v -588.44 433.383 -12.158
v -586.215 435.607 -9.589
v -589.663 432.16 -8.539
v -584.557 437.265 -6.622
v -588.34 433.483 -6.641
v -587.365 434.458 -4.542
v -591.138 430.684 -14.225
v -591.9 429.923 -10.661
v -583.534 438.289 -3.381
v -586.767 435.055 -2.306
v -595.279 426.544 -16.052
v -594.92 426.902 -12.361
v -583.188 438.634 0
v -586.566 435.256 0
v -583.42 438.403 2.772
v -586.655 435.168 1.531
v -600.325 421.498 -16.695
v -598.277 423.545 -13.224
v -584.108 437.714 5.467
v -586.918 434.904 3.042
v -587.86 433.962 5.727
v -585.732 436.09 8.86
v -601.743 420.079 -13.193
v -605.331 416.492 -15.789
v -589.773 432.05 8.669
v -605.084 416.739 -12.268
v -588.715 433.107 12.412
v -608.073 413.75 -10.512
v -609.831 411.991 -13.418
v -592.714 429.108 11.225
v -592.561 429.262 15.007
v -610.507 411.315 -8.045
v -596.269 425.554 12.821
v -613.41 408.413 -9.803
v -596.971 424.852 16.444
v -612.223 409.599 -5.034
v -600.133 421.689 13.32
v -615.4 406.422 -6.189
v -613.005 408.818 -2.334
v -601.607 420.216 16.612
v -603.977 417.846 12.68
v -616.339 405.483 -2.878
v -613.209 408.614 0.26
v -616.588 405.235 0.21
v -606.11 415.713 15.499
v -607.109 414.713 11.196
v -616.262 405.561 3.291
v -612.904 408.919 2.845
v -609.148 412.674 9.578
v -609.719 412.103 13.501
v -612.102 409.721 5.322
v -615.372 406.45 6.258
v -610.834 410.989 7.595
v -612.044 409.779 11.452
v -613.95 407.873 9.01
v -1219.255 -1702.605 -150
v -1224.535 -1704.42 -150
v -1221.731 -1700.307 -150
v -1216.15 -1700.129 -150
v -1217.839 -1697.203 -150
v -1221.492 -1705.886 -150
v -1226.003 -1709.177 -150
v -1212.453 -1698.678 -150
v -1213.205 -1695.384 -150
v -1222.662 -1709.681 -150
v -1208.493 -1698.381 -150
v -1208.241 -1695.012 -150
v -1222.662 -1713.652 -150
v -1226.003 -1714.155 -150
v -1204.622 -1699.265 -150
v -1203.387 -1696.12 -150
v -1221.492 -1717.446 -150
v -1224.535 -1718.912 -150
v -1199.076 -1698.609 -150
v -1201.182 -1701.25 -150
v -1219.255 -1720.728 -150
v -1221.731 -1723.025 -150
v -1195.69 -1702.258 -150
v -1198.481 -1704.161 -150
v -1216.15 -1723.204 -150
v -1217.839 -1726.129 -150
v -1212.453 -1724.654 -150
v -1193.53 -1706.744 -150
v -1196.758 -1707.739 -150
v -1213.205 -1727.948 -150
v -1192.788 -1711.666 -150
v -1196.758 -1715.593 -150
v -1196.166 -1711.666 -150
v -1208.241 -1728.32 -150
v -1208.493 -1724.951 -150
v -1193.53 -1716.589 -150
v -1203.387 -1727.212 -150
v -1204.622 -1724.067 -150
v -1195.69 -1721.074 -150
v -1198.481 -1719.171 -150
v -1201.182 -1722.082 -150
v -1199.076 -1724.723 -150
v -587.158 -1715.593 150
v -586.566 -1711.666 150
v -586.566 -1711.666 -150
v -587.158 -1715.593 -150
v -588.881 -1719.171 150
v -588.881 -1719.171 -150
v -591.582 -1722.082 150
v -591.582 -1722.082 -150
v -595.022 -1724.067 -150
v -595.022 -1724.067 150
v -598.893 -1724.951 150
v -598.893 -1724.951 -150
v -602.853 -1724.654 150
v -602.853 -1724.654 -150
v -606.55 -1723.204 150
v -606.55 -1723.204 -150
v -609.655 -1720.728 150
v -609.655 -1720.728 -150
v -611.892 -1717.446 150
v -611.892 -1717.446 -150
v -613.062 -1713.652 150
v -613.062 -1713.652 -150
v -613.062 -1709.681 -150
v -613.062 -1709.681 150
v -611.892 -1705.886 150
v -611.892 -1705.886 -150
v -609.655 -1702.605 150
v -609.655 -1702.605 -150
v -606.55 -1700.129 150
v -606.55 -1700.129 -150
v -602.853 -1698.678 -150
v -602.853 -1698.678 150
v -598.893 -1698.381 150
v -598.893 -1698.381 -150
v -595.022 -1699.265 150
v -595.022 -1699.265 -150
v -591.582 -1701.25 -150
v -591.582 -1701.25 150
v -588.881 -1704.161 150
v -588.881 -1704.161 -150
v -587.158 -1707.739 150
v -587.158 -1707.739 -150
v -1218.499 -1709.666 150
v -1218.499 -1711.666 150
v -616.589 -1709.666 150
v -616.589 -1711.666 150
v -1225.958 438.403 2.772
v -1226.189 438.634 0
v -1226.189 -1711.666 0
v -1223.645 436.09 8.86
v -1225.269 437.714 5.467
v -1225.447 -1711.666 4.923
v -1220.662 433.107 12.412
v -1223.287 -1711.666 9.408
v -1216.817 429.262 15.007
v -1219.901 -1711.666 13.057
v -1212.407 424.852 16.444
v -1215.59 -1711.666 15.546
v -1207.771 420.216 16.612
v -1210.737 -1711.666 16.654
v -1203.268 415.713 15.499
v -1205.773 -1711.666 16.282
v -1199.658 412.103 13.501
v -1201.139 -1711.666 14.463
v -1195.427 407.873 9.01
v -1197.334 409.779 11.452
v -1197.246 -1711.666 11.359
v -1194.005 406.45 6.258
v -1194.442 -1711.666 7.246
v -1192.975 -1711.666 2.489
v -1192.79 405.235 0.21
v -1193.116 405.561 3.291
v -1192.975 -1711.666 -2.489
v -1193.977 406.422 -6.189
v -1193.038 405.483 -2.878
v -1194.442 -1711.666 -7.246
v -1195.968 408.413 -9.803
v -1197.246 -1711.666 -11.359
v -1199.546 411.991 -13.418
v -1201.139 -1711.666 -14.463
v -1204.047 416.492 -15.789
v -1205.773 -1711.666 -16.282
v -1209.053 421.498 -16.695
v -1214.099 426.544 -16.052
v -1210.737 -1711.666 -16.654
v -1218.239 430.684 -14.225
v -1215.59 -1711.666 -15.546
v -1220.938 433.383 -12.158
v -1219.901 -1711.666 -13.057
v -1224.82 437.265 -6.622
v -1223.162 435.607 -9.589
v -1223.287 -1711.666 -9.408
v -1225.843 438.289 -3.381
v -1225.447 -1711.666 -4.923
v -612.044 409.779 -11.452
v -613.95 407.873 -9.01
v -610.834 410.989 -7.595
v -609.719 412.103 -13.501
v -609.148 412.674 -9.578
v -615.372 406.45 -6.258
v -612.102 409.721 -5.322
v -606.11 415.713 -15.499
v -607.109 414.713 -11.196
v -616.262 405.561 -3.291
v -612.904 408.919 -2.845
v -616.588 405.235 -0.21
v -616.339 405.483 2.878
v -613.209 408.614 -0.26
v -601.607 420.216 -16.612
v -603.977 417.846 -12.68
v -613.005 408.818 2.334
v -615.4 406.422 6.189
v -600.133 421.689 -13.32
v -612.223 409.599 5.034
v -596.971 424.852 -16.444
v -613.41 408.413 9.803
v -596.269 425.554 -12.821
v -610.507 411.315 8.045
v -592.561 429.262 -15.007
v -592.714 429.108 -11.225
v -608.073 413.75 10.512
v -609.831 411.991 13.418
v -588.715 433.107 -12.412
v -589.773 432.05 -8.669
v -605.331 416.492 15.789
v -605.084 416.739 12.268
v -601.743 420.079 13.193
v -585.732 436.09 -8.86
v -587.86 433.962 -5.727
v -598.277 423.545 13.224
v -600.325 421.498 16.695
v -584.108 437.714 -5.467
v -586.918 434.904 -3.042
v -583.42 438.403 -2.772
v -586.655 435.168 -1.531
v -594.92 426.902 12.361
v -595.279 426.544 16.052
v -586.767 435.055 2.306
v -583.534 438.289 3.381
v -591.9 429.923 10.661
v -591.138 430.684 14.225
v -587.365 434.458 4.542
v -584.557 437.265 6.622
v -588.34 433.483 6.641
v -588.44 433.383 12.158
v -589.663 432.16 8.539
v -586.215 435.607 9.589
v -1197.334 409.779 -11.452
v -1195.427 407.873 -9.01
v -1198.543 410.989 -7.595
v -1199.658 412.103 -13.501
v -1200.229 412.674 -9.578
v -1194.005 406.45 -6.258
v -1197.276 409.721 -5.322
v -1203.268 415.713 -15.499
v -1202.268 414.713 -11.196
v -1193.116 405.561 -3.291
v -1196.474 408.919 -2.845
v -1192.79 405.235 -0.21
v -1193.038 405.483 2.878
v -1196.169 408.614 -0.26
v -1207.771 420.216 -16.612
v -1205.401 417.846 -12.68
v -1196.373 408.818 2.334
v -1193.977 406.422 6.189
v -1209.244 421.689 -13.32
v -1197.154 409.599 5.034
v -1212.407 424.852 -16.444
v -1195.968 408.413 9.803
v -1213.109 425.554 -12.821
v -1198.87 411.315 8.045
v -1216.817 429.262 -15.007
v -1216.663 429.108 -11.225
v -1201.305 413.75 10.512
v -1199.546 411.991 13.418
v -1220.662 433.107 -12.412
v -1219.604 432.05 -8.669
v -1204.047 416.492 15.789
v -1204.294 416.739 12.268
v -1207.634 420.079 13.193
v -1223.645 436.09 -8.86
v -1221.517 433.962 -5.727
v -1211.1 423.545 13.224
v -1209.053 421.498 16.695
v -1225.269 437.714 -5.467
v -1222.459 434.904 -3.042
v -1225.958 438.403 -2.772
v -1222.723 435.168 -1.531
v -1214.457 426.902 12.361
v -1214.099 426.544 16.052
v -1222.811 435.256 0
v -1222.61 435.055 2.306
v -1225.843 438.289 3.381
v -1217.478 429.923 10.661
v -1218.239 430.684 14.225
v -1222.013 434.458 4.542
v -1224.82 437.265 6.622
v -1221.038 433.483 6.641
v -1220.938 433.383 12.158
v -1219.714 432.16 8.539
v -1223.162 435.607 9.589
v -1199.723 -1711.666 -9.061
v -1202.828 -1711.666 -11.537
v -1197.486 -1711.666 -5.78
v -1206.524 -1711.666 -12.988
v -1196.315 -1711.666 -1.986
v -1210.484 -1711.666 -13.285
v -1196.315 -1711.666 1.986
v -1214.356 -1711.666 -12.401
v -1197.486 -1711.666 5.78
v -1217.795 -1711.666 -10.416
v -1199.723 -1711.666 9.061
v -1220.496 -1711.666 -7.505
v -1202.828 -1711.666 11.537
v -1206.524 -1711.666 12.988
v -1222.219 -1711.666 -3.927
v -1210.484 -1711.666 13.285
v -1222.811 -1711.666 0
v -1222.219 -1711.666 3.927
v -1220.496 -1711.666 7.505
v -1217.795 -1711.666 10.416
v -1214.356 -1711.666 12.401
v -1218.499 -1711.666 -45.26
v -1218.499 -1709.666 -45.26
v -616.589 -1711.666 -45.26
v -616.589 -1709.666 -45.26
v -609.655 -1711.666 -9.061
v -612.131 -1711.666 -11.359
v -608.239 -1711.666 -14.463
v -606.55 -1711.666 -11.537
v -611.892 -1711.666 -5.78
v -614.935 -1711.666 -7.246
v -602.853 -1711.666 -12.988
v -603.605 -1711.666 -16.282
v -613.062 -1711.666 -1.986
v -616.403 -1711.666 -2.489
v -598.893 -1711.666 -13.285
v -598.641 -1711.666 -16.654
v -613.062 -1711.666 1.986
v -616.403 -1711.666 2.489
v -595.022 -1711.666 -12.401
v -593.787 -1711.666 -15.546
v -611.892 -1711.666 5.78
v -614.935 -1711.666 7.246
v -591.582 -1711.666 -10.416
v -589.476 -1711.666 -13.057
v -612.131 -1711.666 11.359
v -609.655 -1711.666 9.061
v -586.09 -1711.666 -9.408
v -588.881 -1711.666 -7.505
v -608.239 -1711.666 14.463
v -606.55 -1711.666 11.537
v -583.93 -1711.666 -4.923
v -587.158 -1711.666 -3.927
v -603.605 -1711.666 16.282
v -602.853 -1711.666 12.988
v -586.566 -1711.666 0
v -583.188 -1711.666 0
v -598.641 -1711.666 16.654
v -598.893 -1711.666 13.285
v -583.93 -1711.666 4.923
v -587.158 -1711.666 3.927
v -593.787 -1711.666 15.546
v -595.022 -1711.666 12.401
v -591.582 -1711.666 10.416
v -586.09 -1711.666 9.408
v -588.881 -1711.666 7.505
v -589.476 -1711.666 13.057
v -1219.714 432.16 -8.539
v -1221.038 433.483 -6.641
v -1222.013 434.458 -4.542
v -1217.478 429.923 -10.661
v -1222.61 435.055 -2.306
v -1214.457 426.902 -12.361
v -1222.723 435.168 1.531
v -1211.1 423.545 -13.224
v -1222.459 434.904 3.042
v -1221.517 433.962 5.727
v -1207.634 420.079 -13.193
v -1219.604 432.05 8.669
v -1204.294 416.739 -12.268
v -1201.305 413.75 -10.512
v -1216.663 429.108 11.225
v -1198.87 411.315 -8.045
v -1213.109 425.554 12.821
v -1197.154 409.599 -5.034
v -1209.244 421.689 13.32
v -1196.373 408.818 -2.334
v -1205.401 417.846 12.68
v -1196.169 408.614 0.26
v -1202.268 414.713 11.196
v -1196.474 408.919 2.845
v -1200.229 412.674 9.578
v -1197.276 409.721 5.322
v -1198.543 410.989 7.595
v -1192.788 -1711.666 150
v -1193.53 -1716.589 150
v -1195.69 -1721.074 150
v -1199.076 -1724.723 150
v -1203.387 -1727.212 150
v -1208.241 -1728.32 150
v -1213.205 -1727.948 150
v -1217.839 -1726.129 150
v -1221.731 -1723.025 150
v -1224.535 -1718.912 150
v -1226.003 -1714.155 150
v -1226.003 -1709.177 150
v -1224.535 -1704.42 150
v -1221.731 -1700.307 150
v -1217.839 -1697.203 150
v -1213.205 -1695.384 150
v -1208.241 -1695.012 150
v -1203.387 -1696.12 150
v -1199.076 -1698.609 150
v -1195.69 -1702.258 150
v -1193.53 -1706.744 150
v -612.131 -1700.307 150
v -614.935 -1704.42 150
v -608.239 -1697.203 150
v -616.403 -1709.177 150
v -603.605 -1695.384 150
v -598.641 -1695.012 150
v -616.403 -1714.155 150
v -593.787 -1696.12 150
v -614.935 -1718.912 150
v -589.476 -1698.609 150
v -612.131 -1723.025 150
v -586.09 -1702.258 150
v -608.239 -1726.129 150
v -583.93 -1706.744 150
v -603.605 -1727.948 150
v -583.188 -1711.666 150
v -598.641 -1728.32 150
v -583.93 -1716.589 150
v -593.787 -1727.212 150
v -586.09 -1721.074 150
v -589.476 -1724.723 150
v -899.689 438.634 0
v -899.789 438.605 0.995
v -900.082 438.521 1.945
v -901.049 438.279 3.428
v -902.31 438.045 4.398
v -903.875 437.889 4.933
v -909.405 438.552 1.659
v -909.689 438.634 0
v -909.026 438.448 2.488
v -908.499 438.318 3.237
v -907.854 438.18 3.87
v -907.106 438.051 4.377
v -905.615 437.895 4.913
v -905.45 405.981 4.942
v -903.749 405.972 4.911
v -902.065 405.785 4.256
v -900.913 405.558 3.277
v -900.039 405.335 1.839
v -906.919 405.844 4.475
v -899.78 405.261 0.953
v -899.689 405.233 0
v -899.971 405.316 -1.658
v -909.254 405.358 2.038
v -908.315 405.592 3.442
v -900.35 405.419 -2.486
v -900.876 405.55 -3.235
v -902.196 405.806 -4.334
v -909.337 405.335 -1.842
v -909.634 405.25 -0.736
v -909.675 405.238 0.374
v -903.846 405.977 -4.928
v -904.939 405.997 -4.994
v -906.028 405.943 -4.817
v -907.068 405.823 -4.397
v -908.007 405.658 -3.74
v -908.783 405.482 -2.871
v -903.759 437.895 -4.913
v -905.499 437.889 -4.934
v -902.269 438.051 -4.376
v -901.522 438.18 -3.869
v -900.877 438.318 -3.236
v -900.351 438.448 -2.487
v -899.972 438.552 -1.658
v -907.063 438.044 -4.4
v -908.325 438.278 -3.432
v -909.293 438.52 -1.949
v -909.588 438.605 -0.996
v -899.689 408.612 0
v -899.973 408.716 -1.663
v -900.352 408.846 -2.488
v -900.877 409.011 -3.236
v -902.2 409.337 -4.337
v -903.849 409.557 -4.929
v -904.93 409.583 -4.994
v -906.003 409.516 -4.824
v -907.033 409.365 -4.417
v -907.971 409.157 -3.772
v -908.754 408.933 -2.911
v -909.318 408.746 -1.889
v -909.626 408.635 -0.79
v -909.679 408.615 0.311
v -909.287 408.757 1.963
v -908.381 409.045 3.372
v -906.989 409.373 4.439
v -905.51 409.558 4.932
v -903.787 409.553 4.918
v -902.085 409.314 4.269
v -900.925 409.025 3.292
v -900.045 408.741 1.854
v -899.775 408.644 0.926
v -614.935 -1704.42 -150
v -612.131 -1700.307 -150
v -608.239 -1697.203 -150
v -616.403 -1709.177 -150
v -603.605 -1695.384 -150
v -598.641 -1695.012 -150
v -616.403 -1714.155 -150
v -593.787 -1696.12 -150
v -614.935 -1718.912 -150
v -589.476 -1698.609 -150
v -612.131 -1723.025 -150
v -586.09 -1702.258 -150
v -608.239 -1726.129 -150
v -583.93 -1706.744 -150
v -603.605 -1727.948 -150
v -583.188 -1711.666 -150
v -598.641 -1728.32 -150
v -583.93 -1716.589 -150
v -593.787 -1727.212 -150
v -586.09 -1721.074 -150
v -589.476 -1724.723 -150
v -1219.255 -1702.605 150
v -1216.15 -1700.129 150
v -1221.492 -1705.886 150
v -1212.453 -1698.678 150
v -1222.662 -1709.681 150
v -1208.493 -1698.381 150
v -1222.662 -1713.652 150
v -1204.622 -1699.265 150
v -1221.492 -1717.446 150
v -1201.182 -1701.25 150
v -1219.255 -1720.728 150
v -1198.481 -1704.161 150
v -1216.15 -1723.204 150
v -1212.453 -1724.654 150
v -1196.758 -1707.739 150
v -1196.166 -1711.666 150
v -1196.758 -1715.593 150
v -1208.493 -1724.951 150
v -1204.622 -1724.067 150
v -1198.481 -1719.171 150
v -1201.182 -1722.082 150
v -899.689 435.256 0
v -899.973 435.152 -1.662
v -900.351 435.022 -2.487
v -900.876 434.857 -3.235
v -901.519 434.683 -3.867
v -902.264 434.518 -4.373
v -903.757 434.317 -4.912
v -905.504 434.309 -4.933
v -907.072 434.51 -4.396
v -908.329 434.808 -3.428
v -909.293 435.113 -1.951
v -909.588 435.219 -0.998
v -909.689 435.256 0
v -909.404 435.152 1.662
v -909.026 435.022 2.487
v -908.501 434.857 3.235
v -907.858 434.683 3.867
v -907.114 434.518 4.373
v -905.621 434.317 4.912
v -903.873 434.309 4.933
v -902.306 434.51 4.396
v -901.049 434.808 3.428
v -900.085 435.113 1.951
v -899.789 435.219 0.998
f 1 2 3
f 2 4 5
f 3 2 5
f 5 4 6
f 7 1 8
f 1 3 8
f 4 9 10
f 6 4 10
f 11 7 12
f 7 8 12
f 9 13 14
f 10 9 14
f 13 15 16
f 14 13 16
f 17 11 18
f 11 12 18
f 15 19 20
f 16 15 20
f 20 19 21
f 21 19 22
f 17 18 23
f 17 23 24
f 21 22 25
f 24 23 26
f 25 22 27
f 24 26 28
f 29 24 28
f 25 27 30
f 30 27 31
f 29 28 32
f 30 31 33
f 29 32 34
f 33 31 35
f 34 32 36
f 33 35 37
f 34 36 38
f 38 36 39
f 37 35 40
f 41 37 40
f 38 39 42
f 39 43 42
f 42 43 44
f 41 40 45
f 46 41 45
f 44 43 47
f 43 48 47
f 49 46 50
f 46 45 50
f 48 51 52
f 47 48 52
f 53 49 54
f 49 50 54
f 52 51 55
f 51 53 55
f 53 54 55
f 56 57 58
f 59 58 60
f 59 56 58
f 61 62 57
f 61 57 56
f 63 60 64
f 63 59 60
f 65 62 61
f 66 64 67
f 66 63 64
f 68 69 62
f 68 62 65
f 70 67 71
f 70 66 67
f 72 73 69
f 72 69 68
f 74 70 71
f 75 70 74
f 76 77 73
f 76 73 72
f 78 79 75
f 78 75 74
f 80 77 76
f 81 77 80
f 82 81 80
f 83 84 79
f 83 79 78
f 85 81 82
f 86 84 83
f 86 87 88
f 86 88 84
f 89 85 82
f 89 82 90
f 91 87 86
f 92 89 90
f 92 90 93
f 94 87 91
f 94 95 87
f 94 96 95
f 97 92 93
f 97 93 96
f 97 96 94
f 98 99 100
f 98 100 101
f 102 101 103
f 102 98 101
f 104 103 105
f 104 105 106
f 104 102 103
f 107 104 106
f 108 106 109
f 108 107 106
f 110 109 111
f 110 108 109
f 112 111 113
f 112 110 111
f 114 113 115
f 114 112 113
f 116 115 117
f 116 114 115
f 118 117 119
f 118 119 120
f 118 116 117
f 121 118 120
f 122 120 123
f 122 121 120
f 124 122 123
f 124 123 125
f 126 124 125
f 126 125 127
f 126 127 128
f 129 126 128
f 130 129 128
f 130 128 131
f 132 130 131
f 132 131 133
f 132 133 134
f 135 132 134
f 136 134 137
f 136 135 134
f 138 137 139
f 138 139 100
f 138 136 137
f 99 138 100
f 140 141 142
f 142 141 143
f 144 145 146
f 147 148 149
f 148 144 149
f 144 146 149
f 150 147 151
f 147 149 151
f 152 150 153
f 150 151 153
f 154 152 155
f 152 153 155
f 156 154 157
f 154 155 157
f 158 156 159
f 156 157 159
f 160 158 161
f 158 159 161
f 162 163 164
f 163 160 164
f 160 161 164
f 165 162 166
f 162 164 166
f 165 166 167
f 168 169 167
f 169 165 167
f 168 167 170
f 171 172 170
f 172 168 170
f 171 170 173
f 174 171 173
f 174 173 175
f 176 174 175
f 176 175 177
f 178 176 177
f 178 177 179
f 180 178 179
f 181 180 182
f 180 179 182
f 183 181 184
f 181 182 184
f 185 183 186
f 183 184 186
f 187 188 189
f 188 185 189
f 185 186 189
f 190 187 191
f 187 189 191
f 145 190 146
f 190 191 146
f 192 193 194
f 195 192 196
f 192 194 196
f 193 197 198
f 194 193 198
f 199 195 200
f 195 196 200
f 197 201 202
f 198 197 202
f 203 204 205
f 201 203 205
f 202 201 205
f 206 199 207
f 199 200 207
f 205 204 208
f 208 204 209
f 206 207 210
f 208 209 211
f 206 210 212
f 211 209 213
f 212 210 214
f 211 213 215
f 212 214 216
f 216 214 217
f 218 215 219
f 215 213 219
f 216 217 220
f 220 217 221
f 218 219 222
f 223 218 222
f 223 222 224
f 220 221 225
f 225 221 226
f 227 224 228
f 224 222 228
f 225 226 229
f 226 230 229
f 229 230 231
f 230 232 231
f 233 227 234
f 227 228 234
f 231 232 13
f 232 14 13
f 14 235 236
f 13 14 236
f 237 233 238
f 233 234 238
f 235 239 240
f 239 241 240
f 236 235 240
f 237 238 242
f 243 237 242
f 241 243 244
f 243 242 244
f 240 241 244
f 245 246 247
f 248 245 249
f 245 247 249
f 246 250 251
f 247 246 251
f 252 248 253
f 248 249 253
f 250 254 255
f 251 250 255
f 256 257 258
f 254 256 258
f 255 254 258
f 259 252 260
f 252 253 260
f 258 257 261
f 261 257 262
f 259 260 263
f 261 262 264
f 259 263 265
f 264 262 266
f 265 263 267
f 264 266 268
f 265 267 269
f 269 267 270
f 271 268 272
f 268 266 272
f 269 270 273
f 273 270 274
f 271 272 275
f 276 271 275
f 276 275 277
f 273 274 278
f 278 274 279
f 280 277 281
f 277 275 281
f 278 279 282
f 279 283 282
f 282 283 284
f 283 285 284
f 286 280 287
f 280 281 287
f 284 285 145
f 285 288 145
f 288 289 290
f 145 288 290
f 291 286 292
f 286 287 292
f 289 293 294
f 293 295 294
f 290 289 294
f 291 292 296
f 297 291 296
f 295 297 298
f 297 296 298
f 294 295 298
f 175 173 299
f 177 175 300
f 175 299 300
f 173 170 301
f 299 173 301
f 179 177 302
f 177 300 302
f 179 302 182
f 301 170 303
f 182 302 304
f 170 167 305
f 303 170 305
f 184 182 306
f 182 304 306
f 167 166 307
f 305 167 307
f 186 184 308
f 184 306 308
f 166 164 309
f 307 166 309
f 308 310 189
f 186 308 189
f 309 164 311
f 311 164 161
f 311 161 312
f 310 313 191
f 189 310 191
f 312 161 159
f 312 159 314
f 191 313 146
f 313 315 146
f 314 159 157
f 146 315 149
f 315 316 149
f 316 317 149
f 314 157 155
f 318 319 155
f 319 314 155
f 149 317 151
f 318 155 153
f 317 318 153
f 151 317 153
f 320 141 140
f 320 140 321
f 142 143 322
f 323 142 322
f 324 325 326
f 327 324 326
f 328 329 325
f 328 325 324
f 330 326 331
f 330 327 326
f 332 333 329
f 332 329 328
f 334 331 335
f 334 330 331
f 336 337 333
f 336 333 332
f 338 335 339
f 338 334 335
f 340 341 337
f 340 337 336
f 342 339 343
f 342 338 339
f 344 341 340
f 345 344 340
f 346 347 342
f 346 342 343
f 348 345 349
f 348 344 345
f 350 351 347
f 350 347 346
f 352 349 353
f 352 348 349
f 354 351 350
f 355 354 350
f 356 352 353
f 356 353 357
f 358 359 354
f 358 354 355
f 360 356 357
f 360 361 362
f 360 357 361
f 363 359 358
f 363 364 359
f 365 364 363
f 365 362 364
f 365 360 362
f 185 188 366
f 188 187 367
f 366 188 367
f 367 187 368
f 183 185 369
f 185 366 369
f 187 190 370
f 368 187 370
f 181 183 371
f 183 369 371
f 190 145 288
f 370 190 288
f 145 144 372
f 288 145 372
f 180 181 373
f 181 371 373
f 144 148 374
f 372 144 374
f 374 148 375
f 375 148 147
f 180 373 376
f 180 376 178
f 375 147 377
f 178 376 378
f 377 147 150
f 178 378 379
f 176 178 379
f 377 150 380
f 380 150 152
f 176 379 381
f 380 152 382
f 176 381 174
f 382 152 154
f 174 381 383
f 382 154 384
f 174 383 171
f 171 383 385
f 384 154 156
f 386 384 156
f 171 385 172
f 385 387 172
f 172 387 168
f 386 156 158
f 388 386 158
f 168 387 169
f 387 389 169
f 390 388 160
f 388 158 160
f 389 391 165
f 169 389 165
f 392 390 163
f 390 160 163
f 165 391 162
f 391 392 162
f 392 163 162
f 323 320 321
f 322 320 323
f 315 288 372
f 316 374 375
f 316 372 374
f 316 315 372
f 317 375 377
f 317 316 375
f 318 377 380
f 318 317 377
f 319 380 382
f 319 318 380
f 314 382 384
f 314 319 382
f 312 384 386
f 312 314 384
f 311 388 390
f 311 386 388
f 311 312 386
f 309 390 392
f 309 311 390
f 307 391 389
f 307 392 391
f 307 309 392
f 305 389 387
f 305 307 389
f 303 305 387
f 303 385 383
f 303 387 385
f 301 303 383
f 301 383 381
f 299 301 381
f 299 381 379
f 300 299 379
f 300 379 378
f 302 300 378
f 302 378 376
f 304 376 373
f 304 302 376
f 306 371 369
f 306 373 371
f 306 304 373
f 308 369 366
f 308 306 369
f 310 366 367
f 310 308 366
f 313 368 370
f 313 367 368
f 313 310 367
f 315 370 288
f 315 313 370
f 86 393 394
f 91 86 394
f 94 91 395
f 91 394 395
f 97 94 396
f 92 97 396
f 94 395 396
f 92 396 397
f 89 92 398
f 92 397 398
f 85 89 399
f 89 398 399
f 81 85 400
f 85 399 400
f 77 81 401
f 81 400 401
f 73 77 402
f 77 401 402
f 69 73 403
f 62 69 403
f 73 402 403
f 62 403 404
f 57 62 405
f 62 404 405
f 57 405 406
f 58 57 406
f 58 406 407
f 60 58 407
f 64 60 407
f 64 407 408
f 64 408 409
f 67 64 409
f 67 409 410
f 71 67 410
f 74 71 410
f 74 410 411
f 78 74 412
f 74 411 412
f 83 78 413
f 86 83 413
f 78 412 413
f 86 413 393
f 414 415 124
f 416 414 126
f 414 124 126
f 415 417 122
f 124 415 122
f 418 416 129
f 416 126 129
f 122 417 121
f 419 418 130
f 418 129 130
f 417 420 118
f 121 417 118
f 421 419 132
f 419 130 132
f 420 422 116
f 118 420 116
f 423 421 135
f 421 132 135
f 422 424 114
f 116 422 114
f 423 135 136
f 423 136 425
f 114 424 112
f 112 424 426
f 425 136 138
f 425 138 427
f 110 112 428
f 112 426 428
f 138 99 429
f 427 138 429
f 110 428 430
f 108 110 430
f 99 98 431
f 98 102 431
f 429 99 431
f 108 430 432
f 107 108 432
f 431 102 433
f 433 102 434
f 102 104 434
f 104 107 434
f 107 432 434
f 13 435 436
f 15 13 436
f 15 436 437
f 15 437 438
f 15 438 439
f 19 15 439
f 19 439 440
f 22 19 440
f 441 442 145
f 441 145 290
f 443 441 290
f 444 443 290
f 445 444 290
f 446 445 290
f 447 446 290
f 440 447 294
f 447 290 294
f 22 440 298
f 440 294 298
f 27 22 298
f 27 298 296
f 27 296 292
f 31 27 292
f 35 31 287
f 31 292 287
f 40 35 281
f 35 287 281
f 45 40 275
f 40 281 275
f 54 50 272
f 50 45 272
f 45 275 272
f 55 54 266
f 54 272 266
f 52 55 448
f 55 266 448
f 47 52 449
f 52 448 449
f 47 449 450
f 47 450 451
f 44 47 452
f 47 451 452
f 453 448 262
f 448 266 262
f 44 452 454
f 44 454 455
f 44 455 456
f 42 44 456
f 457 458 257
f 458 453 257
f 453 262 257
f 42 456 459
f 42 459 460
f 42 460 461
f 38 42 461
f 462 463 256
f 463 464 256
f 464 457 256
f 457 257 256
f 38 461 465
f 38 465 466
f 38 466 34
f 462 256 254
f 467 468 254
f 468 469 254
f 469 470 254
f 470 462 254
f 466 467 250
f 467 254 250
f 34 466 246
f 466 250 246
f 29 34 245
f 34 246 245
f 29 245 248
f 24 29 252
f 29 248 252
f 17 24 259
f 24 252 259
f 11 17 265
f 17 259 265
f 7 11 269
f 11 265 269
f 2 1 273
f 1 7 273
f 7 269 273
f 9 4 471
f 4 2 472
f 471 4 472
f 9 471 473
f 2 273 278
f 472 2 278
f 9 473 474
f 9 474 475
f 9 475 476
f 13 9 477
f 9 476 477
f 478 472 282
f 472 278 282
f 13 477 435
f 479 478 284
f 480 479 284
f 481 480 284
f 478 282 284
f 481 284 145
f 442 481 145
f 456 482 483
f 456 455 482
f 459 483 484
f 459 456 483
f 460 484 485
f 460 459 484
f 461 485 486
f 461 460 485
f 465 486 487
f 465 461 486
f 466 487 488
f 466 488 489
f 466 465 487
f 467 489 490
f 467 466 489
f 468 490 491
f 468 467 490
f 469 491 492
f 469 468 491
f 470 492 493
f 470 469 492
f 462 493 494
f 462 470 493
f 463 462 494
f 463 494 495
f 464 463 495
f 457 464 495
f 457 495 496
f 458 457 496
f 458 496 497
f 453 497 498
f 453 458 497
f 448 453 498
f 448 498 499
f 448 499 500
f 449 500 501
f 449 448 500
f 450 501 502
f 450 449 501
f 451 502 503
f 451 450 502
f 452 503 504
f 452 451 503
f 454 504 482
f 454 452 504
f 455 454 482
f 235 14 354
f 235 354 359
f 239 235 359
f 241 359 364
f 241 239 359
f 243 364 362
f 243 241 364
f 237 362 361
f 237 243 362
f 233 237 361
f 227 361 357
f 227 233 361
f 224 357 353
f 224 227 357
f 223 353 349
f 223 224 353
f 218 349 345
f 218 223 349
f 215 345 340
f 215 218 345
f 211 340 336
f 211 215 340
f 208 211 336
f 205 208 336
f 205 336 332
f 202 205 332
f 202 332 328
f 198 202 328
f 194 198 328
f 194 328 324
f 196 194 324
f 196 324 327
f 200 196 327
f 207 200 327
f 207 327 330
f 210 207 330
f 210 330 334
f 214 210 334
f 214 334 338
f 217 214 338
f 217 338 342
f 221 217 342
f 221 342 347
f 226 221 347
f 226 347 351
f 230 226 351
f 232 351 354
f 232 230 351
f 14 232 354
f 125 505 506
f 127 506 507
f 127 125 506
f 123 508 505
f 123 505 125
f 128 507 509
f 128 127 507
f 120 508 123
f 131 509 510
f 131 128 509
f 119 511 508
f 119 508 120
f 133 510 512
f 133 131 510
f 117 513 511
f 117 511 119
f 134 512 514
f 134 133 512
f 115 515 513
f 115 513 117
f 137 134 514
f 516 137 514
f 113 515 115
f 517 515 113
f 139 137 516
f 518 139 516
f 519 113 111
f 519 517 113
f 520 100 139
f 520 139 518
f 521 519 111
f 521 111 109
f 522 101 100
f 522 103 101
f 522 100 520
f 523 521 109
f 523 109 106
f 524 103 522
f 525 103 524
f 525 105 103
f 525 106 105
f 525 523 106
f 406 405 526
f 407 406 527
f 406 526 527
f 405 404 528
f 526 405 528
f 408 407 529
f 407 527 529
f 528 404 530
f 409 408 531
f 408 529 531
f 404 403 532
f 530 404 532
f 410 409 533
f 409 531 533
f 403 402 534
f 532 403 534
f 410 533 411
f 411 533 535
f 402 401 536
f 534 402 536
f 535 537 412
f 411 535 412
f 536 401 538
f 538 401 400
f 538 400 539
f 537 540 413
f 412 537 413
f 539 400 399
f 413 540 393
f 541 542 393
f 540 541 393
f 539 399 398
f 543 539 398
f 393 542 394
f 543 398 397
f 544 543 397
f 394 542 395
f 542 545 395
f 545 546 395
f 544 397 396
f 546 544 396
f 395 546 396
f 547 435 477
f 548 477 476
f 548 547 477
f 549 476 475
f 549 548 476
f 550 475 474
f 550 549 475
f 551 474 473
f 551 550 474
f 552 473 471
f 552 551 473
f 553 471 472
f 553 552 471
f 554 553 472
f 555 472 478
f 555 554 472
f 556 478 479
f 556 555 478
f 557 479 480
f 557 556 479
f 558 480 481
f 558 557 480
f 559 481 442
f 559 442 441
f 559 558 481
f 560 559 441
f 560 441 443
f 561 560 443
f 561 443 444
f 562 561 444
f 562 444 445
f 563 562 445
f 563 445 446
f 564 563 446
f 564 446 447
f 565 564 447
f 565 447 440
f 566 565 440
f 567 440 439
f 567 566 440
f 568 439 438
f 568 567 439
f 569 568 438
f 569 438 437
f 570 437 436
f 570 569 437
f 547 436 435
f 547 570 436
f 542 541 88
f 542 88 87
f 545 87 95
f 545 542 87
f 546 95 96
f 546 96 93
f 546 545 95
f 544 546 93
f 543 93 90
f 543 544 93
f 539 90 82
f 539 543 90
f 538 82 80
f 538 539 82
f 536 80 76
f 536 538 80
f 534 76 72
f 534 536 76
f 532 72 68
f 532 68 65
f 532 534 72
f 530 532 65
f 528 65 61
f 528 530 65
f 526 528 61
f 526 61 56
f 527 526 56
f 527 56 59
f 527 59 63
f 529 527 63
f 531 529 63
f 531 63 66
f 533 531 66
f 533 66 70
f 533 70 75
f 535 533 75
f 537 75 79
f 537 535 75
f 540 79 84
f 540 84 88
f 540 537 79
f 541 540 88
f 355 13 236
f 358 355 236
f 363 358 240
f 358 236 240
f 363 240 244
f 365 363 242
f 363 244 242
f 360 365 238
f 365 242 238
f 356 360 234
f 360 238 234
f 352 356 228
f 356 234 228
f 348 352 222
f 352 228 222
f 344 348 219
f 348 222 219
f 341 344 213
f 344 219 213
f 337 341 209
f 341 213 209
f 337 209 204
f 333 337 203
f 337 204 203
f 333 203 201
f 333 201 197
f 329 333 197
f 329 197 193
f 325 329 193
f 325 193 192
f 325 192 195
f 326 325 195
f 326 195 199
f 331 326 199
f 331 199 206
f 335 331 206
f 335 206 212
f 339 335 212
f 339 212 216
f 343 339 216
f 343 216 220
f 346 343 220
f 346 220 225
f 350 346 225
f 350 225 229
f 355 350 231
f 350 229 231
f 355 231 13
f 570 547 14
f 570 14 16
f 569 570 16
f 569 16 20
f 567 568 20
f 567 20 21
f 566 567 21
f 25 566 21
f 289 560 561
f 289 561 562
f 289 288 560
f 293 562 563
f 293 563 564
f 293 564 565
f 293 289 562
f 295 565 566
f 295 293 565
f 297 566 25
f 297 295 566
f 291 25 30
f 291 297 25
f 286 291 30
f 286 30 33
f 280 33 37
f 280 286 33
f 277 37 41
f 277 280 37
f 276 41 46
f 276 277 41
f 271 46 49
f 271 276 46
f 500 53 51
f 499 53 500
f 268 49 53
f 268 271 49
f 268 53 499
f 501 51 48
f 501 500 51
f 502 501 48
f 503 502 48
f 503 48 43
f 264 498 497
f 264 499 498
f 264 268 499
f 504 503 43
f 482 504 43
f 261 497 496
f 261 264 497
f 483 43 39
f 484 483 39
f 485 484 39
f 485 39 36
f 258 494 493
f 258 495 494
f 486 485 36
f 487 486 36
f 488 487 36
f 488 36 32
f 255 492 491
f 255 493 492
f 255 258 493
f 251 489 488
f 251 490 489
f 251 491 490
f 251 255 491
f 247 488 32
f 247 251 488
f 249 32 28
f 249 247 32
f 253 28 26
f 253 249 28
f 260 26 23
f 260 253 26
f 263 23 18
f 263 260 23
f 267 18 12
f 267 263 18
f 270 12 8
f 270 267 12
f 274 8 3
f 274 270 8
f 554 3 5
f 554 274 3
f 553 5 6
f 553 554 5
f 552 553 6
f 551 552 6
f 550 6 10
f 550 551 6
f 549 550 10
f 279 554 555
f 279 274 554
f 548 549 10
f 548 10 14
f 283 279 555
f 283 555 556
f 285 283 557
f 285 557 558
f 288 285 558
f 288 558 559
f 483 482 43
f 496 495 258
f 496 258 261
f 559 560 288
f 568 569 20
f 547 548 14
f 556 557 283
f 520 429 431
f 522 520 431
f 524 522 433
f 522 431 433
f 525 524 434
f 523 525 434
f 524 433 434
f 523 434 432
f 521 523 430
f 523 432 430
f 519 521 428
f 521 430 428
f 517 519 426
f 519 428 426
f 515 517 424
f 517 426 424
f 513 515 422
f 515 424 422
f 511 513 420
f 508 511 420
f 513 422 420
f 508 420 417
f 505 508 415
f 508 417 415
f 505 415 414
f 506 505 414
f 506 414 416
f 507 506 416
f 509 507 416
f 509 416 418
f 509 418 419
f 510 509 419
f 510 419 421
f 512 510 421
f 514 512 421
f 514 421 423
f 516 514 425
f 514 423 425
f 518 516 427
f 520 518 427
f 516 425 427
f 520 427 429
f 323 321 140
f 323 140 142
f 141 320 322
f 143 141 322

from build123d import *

# Parameters (mm, degrees)
SKETCH11_R                           = 16.7005
SKETCH11_R_2                         = 13.3223
PIPE_CONFIGURED_1_0_SCH_40_1_DEPTH   = 2158.218073598
SKETCH11_ON_SEGMENT_2_R              = 16.7005
SKETCH11_ON_SEGMENT_2_R_2            = 13.3223
PIPE_CONFIGURED_1_0_SCH_40_1_2_DEPTH = 658.836147197
SKETCH11_ON_SEGMENT_3_R              = 16.7005
SKETCH11_ON_SEGMENT_3_R_2            = 13.3223
PIPE_CONFIGURED_1_0_SCH_40_1_3_DEPTH = 2158.218073598
SKETCH12_R                           = 16.7005
SKETCH12_R_2                         = 13.3223
PIPE_CONFIGURED_1_0_SCH_40_2_DEPTH   = 300
SKETCH12_ON_SEGMENT_2_R              = 16.7005
SKETCH12_ON_SEGMENT_2_R_2            = 13.3223
PIPE_CONFIGURED_1_0_SCH_40_2_2_DEPTH = 300
CUT_EXTRUDE2_START                   = -34
CUT_EXTRUDE2_OUTLINE_R               = 5
CUT_EXTRUDE2_DEPTH                   = 35
SKETCH15_W                           = 601.909903741
SKETCH15_H                           = 195.259888428
BOSS_EXTRUDE1_DEPTH                  = 2


with BuildPart() as part:
    # Sketch11 → Pipe - configured 1.0 SCH 40(1) (new body)
    with BuildSketch(Plane(origin=(-1209.488751956, -1711.666086539, 0), x_dir=(-1, 0, 0), z_dir=(0, 1, 0))):
        Circle(SKETCH11_R)
        Circle(SKETCH11_R_2, mode=Mode.SUBTRACT)
    extrude(amount=PIPE_CONFIGURED_1_0_SCH_40_1_DEPTH)

    # Pipe - configured 1.0 SCH 40(1) mitre 1
    split(bisect_by=Plane(origin=(-1209.488751956, 421.933913461, 0), x_dir=(0.707106781, -0.707106781, 0), z_dir=(-0.707106781, -0.707106781, 0)), keep=Keep.TOP)


with BuildPart() as body_2:
    # Sketch11 on segment 2 (carried to segment 2) → Pipe - configured 1.0 SCH 40_1 2 (new body)
    with BuildSketch(Plane(origin=(-1234.106825554, 421.933913461, 0), x_dir=(0, 1, 0), z_dir=(1, 0, 0))):
        Circle(SKETCH11_ON_SEGMENT_2_R)
        Circle(SKETCH11_ON_SEGMENT_2_R_2, mode=Mode.SUBTRACT)
    extrude(amount=PIPE_CONFIGURED_1_0_SCH_40_1_2_DEPTH)

    # Pipe - configured 1.0 SCH 40_1 2 mitre 1
    split(bisect_by=Plane(origin=(-1209.488751956, 421.933913461, 0), x_dir=(-0.707106781, 0.707106781, 0), z_dir=(0.707106781, 0.707106781, 0)), keep=Keep.TOP)

    # Pipe - configured 1.0 SCH 40_1 2 mitre 2
    split(bisect_by=Plane(origin=(-599.888751956, 421.933913461, 0), x_dir=(-0.707106781, -0.707106781, 0), z_dir=(-0.707106781, 0.707106781, 0)), keep=Keep.TOP)

    # Cut-Extrude2: read off the stored shape, not the designer's step
    # Cut-Extrude2 outline → Cut-Extrude2 (cut)
    with BuildSketch(Plane(origin=(0, 438.633719211, 0), x_dir=(1, 0, 0), z_dir=(0, 1, 0)).offset(CUT_EXTRUDE2_START)):
        with Locations((-904.688751956, 0)):
            Circle(CUT_EXTRUDE2_OUTLINE_R)
    extrude(amount=CUT_EXTRUDE2_DEPTH, mode=Mode.SUBTRACT)


with BuildPart() as body_3:
    # Sketch11 on segment 3 (carried to segment 3) → Pipe - configured 1.0 SCH 40_1 3 (new body)
    with BuildSketch(Plane(origin=(-599.888751956, 446.551987059, 0), x_dir=(1, 0, 0), z_dir=(0, -1, 0))):
        Circle(SKETCH11_ON_SEGMENT_3_R)
        Circle(SKETCH11_ON_SEGMENT_3_R_2, mode=Mode.SUBTRACT)
    extrude(amount=PIPE_CONFIGURED_1_0_SCH_40_1_3_DEPTH)

    # Pipe - configured 1.0 SCH 40_1 3 mitre 1
    split(bisect_by=Plane(origin=(-599.888751956, 421.933913461, 0), x_dir=(0.707106781, 0.707106781, 0), z_dir=(0.707106781, -0.707106781, 0)), keep=Keep.TOP)


with BuildPart() as body_4:
    # Sketch12 → Pipe - configured 1.0 SCH 40(2) (new body)
    with BuildSketch(Plane(origin=(-599.888751956, -1711.666086539, 150), x_dir=(1, 0, 0), z_dir=(0, 0, -1))):
        Circle(SKETCH12_R)
        Circle(SKETCH12_R_2, mode=Mode.SUBTRACT)
    extrude(amount=PIPE_CONFIGURED_1_0_SCH_40_2_DEPTH)


with BuildPart() as body_5:
    # Sketch12 on segment 2 (carried to segment 2) → Pipe - configured 1.0 SCH 40_2 2 (new body)
    with BuildSketch(Plane(origin=(-1209.488751956, -1711.666086539, 150), x_dir=(1, 0, 0), z_dir=(0, 0, -1))):
        Circle(SKETCH12_ON_SEGMENT_2_R)
        Circle(SKETCH12_ON_SEGMENT_2_R_2, mode=Mode.SUBTRACT)
    extrude(amount=PIPE_CONFIGURED_1_0_SCH_40_2_2_DEPTH)


with BuildPart() as body_6:
    # Sketch15 → Boss-Extrude1 (new body)
    with BuildSketch(Plane(origin=(0, -1711.666086539, 0), x_dir=(1, 0, 0), z_dir=(0, 1, 0))):
        with Locations((-917.544203827, -52.370055786)):
            Rectangle(SKETCH15_W, SKETCH15_H)
    extrude(amount=BOSS_EXTRUDE1_DEPTH)


solid = Compound([part.part, body_2.part, body_3.part, body_4.part, body_5.part, body_6.part])
